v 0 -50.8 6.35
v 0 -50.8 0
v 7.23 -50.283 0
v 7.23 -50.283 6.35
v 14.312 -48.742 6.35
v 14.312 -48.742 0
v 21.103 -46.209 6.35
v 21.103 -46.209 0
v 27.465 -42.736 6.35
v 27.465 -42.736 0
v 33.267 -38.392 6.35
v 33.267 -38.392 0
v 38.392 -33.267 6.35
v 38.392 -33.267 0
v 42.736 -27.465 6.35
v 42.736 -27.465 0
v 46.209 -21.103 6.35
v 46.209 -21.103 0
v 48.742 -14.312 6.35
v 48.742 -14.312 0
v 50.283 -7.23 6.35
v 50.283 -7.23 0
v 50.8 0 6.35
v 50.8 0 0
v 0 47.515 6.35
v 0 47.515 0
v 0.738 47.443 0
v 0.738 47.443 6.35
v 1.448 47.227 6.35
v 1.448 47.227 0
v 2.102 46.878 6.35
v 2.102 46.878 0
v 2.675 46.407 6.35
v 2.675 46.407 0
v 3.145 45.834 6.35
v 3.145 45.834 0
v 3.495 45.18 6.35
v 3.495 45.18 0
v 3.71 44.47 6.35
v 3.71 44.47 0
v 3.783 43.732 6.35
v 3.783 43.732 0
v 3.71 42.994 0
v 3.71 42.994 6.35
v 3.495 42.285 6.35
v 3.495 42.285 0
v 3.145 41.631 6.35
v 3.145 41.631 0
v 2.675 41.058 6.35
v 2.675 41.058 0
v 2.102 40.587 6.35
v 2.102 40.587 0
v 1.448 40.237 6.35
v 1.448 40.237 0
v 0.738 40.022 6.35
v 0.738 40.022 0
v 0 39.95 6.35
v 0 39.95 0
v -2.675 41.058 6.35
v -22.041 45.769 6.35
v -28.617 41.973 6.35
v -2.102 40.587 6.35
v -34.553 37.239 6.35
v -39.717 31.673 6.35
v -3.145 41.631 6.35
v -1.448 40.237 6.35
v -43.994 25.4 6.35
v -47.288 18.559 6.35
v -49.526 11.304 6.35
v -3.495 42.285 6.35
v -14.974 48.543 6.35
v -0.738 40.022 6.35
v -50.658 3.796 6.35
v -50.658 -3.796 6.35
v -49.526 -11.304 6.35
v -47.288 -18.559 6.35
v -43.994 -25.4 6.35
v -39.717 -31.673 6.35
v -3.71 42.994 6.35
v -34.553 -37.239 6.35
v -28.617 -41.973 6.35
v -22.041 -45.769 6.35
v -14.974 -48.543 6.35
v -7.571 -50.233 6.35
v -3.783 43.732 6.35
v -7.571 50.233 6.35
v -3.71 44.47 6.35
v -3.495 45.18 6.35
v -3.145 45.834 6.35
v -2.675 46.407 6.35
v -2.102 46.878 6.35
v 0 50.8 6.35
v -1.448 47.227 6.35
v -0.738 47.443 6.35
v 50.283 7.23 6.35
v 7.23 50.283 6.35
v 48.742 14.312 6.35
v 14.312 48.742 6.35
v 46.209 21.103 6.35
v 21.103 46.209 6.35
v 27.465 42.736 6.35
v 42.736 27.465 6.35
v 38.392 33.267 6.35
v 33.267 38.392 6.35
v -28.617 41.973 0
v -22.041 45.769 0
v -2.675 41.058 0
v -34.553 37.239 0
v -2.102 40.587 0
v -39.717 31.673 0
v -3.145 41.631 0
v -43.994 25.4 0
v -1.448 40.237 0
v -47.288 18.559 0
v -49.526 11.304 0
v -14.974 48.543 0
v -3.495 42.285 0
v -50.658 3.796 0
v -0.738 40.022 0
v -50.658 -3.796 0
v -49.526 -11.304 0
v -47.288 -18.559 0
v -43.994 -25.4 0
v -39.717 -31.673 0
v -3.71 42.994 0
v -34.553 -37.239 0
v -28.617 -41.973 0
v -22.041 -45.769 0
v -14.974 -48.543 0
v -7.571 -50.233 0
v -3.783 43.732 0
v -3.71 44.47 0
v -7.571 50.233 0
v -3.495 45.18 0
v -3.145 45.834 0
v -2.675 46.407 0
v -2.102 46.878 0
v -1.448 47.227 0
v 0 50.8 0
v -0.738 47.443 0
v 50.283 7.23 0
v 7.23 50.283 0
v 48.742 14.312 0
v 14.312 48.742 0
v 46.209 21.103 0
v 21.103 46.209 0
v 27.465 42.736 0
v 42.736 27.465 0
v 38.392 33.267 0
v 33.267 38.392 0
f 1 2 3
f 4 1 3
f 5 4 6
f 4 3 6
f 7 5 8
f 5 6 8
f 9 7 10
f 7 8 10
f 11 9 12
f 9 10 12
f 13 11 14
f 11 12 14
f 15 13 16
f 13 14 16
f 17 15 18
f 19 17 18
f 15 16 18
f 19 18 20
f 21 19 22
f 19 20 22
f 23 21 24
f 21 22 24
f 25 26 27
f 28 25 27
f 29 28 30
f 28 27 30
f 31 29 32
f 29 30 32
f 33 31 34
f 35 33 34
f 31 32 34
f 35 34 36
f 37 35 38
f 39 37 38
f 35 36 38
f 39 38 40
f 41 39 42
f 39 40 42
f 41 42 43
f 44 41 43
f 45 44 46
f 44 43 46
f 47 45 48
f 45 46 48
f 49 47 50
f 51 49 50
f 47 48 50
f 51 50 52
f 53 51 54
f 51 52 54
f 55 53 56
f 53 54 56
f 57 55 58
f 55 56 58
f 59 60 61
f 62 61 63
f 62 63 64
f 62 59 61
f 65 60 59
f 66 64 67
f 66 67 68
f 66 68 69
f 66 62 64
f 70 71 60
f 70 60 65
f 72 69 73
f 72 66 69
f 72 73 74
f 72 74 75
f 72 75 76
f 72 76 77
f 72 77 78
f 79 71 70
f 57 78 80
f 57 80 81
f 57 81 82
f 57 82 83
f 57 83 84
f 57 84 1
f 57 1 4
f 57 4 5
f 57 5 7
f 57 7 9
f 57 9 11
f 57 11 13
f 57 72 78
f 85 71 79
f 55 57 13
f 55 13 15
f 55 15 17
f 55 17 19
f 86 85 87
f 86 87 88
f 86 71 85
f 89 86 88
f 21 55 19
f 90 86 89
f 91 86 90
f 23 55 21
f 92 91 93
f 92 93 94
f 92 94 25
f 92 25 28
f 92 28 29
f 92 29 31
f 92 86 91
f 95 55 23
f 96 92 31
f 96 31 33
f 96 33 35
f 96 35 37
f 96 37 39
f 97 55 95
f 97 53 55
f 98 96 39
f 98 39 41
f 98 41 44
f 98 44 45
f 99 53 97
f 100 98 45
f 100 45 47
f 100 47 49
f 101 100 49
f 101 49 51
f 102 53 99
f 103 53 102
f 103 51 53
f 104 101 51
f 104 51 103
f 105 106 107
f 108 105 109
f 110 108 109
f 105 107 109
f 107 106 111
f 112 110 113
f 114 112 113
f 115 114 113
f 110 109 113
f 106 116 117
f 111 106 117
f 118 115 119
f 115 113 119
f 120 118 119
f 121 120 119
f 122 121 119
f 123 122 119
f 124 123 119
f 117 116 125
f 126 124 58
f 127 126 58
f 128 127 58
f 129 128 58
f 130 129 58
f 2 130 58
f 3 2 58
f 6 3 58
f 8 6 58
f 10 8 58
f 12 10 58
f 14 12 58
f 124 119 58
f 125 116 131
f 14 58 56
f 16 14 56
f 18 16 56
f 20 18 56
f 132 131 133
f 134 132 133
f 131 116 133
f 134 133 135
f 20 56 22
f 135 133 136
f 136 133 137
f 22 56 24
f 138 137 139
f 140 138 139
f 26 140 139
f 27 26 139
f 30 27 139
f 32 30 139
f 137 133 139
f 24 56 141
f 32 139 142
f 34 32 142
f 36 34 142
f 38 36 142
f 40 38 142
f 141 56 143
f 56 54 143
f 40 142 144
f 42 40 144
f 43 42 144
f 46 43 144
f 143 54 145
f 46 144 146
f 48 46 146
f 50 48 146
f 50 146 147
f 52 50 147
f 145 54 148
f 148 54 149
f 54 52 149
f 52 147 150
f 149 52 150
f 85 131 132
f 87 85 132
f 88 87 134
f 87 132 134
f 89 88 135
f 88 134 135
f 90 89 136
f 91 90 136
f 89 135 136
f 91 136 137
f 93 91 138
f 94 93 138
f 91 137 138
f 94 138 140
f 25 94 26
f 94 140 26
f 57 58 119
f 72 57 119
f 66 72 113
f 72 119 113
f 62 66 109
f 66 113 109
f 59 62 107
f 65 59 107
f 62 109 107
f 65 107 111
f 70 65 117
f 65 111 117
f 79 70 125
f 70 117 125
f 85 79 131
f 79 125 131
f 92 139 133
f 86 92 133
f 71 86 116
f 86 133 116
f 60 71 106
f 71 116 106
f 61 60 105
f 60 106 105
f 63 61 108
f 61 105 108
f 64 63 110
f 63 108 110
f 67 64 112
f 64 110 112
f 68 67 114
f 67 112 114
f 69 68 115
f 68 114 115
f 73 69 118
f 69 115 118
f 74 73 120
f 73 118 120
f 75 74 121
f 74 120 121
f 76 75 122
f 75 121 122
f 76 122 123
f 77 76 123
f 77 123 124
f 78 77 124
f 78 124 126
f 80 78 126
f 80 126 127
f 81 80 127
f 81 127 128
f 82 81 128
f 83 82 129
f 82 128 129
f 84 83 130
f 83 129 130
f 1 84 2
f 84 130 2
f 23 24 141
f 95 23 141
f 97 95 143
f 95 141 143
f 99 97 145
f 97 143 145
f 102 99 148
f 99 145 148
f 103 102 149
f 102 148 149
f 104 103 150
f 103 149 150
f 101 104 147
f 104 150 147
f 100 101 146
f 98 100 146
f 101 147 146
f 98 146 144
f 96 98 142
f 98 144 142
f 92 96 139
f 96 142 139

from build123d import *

# Parameters (mm, degrees)
F1_DEPTH = 6.35


with BuildPart() as f1:
    # F0 (on Top) → F1 (new body)
    with BuildSketch(Plane.XY):
        with BuildLine():
            Line((0, 47.5154318641), (0, 50.8))
            ThreePointArc((0, 50.8), (-50.8, 0), (0, -50.8))
            Line((0, -50.8), (0, 39.9495042134))
            ThreePointArc((0, 39.9495042134), (-2.6749593739, 41.0575086649), (-3.7829638253, 43.7324680388))
            ThreePointArc((-3.7829638253, 43.7324680388), (-2.6749593739, 46.4074274127), (0, 47.5154318641))
        make_face()
        with BuildLine():
            ThreePointArc((0, -50.8), (35.9210244843, -35.9210244843), (50.8, 0))
            ThreePointArc((50.8, 0), (35.9210244843, 35.9210244843), (0, 50.8))
            Line((0, 50.8), (0, 47.5154318641))
            ThreePointArc((0, 47.5154318641), (2.6749593739, 46.4074274127), (3.7829638253, 43.7324680388))
            ThreePointArc((3.7829638253, 43.7324680388), (2.6749593739, 41.0575086649), (0, 39.9495042134))
            Line((0, 39.9495042134), (0, -50.8))
        make_face()
    extrude(amount=F1_DEPTH)


solid = f1.part
